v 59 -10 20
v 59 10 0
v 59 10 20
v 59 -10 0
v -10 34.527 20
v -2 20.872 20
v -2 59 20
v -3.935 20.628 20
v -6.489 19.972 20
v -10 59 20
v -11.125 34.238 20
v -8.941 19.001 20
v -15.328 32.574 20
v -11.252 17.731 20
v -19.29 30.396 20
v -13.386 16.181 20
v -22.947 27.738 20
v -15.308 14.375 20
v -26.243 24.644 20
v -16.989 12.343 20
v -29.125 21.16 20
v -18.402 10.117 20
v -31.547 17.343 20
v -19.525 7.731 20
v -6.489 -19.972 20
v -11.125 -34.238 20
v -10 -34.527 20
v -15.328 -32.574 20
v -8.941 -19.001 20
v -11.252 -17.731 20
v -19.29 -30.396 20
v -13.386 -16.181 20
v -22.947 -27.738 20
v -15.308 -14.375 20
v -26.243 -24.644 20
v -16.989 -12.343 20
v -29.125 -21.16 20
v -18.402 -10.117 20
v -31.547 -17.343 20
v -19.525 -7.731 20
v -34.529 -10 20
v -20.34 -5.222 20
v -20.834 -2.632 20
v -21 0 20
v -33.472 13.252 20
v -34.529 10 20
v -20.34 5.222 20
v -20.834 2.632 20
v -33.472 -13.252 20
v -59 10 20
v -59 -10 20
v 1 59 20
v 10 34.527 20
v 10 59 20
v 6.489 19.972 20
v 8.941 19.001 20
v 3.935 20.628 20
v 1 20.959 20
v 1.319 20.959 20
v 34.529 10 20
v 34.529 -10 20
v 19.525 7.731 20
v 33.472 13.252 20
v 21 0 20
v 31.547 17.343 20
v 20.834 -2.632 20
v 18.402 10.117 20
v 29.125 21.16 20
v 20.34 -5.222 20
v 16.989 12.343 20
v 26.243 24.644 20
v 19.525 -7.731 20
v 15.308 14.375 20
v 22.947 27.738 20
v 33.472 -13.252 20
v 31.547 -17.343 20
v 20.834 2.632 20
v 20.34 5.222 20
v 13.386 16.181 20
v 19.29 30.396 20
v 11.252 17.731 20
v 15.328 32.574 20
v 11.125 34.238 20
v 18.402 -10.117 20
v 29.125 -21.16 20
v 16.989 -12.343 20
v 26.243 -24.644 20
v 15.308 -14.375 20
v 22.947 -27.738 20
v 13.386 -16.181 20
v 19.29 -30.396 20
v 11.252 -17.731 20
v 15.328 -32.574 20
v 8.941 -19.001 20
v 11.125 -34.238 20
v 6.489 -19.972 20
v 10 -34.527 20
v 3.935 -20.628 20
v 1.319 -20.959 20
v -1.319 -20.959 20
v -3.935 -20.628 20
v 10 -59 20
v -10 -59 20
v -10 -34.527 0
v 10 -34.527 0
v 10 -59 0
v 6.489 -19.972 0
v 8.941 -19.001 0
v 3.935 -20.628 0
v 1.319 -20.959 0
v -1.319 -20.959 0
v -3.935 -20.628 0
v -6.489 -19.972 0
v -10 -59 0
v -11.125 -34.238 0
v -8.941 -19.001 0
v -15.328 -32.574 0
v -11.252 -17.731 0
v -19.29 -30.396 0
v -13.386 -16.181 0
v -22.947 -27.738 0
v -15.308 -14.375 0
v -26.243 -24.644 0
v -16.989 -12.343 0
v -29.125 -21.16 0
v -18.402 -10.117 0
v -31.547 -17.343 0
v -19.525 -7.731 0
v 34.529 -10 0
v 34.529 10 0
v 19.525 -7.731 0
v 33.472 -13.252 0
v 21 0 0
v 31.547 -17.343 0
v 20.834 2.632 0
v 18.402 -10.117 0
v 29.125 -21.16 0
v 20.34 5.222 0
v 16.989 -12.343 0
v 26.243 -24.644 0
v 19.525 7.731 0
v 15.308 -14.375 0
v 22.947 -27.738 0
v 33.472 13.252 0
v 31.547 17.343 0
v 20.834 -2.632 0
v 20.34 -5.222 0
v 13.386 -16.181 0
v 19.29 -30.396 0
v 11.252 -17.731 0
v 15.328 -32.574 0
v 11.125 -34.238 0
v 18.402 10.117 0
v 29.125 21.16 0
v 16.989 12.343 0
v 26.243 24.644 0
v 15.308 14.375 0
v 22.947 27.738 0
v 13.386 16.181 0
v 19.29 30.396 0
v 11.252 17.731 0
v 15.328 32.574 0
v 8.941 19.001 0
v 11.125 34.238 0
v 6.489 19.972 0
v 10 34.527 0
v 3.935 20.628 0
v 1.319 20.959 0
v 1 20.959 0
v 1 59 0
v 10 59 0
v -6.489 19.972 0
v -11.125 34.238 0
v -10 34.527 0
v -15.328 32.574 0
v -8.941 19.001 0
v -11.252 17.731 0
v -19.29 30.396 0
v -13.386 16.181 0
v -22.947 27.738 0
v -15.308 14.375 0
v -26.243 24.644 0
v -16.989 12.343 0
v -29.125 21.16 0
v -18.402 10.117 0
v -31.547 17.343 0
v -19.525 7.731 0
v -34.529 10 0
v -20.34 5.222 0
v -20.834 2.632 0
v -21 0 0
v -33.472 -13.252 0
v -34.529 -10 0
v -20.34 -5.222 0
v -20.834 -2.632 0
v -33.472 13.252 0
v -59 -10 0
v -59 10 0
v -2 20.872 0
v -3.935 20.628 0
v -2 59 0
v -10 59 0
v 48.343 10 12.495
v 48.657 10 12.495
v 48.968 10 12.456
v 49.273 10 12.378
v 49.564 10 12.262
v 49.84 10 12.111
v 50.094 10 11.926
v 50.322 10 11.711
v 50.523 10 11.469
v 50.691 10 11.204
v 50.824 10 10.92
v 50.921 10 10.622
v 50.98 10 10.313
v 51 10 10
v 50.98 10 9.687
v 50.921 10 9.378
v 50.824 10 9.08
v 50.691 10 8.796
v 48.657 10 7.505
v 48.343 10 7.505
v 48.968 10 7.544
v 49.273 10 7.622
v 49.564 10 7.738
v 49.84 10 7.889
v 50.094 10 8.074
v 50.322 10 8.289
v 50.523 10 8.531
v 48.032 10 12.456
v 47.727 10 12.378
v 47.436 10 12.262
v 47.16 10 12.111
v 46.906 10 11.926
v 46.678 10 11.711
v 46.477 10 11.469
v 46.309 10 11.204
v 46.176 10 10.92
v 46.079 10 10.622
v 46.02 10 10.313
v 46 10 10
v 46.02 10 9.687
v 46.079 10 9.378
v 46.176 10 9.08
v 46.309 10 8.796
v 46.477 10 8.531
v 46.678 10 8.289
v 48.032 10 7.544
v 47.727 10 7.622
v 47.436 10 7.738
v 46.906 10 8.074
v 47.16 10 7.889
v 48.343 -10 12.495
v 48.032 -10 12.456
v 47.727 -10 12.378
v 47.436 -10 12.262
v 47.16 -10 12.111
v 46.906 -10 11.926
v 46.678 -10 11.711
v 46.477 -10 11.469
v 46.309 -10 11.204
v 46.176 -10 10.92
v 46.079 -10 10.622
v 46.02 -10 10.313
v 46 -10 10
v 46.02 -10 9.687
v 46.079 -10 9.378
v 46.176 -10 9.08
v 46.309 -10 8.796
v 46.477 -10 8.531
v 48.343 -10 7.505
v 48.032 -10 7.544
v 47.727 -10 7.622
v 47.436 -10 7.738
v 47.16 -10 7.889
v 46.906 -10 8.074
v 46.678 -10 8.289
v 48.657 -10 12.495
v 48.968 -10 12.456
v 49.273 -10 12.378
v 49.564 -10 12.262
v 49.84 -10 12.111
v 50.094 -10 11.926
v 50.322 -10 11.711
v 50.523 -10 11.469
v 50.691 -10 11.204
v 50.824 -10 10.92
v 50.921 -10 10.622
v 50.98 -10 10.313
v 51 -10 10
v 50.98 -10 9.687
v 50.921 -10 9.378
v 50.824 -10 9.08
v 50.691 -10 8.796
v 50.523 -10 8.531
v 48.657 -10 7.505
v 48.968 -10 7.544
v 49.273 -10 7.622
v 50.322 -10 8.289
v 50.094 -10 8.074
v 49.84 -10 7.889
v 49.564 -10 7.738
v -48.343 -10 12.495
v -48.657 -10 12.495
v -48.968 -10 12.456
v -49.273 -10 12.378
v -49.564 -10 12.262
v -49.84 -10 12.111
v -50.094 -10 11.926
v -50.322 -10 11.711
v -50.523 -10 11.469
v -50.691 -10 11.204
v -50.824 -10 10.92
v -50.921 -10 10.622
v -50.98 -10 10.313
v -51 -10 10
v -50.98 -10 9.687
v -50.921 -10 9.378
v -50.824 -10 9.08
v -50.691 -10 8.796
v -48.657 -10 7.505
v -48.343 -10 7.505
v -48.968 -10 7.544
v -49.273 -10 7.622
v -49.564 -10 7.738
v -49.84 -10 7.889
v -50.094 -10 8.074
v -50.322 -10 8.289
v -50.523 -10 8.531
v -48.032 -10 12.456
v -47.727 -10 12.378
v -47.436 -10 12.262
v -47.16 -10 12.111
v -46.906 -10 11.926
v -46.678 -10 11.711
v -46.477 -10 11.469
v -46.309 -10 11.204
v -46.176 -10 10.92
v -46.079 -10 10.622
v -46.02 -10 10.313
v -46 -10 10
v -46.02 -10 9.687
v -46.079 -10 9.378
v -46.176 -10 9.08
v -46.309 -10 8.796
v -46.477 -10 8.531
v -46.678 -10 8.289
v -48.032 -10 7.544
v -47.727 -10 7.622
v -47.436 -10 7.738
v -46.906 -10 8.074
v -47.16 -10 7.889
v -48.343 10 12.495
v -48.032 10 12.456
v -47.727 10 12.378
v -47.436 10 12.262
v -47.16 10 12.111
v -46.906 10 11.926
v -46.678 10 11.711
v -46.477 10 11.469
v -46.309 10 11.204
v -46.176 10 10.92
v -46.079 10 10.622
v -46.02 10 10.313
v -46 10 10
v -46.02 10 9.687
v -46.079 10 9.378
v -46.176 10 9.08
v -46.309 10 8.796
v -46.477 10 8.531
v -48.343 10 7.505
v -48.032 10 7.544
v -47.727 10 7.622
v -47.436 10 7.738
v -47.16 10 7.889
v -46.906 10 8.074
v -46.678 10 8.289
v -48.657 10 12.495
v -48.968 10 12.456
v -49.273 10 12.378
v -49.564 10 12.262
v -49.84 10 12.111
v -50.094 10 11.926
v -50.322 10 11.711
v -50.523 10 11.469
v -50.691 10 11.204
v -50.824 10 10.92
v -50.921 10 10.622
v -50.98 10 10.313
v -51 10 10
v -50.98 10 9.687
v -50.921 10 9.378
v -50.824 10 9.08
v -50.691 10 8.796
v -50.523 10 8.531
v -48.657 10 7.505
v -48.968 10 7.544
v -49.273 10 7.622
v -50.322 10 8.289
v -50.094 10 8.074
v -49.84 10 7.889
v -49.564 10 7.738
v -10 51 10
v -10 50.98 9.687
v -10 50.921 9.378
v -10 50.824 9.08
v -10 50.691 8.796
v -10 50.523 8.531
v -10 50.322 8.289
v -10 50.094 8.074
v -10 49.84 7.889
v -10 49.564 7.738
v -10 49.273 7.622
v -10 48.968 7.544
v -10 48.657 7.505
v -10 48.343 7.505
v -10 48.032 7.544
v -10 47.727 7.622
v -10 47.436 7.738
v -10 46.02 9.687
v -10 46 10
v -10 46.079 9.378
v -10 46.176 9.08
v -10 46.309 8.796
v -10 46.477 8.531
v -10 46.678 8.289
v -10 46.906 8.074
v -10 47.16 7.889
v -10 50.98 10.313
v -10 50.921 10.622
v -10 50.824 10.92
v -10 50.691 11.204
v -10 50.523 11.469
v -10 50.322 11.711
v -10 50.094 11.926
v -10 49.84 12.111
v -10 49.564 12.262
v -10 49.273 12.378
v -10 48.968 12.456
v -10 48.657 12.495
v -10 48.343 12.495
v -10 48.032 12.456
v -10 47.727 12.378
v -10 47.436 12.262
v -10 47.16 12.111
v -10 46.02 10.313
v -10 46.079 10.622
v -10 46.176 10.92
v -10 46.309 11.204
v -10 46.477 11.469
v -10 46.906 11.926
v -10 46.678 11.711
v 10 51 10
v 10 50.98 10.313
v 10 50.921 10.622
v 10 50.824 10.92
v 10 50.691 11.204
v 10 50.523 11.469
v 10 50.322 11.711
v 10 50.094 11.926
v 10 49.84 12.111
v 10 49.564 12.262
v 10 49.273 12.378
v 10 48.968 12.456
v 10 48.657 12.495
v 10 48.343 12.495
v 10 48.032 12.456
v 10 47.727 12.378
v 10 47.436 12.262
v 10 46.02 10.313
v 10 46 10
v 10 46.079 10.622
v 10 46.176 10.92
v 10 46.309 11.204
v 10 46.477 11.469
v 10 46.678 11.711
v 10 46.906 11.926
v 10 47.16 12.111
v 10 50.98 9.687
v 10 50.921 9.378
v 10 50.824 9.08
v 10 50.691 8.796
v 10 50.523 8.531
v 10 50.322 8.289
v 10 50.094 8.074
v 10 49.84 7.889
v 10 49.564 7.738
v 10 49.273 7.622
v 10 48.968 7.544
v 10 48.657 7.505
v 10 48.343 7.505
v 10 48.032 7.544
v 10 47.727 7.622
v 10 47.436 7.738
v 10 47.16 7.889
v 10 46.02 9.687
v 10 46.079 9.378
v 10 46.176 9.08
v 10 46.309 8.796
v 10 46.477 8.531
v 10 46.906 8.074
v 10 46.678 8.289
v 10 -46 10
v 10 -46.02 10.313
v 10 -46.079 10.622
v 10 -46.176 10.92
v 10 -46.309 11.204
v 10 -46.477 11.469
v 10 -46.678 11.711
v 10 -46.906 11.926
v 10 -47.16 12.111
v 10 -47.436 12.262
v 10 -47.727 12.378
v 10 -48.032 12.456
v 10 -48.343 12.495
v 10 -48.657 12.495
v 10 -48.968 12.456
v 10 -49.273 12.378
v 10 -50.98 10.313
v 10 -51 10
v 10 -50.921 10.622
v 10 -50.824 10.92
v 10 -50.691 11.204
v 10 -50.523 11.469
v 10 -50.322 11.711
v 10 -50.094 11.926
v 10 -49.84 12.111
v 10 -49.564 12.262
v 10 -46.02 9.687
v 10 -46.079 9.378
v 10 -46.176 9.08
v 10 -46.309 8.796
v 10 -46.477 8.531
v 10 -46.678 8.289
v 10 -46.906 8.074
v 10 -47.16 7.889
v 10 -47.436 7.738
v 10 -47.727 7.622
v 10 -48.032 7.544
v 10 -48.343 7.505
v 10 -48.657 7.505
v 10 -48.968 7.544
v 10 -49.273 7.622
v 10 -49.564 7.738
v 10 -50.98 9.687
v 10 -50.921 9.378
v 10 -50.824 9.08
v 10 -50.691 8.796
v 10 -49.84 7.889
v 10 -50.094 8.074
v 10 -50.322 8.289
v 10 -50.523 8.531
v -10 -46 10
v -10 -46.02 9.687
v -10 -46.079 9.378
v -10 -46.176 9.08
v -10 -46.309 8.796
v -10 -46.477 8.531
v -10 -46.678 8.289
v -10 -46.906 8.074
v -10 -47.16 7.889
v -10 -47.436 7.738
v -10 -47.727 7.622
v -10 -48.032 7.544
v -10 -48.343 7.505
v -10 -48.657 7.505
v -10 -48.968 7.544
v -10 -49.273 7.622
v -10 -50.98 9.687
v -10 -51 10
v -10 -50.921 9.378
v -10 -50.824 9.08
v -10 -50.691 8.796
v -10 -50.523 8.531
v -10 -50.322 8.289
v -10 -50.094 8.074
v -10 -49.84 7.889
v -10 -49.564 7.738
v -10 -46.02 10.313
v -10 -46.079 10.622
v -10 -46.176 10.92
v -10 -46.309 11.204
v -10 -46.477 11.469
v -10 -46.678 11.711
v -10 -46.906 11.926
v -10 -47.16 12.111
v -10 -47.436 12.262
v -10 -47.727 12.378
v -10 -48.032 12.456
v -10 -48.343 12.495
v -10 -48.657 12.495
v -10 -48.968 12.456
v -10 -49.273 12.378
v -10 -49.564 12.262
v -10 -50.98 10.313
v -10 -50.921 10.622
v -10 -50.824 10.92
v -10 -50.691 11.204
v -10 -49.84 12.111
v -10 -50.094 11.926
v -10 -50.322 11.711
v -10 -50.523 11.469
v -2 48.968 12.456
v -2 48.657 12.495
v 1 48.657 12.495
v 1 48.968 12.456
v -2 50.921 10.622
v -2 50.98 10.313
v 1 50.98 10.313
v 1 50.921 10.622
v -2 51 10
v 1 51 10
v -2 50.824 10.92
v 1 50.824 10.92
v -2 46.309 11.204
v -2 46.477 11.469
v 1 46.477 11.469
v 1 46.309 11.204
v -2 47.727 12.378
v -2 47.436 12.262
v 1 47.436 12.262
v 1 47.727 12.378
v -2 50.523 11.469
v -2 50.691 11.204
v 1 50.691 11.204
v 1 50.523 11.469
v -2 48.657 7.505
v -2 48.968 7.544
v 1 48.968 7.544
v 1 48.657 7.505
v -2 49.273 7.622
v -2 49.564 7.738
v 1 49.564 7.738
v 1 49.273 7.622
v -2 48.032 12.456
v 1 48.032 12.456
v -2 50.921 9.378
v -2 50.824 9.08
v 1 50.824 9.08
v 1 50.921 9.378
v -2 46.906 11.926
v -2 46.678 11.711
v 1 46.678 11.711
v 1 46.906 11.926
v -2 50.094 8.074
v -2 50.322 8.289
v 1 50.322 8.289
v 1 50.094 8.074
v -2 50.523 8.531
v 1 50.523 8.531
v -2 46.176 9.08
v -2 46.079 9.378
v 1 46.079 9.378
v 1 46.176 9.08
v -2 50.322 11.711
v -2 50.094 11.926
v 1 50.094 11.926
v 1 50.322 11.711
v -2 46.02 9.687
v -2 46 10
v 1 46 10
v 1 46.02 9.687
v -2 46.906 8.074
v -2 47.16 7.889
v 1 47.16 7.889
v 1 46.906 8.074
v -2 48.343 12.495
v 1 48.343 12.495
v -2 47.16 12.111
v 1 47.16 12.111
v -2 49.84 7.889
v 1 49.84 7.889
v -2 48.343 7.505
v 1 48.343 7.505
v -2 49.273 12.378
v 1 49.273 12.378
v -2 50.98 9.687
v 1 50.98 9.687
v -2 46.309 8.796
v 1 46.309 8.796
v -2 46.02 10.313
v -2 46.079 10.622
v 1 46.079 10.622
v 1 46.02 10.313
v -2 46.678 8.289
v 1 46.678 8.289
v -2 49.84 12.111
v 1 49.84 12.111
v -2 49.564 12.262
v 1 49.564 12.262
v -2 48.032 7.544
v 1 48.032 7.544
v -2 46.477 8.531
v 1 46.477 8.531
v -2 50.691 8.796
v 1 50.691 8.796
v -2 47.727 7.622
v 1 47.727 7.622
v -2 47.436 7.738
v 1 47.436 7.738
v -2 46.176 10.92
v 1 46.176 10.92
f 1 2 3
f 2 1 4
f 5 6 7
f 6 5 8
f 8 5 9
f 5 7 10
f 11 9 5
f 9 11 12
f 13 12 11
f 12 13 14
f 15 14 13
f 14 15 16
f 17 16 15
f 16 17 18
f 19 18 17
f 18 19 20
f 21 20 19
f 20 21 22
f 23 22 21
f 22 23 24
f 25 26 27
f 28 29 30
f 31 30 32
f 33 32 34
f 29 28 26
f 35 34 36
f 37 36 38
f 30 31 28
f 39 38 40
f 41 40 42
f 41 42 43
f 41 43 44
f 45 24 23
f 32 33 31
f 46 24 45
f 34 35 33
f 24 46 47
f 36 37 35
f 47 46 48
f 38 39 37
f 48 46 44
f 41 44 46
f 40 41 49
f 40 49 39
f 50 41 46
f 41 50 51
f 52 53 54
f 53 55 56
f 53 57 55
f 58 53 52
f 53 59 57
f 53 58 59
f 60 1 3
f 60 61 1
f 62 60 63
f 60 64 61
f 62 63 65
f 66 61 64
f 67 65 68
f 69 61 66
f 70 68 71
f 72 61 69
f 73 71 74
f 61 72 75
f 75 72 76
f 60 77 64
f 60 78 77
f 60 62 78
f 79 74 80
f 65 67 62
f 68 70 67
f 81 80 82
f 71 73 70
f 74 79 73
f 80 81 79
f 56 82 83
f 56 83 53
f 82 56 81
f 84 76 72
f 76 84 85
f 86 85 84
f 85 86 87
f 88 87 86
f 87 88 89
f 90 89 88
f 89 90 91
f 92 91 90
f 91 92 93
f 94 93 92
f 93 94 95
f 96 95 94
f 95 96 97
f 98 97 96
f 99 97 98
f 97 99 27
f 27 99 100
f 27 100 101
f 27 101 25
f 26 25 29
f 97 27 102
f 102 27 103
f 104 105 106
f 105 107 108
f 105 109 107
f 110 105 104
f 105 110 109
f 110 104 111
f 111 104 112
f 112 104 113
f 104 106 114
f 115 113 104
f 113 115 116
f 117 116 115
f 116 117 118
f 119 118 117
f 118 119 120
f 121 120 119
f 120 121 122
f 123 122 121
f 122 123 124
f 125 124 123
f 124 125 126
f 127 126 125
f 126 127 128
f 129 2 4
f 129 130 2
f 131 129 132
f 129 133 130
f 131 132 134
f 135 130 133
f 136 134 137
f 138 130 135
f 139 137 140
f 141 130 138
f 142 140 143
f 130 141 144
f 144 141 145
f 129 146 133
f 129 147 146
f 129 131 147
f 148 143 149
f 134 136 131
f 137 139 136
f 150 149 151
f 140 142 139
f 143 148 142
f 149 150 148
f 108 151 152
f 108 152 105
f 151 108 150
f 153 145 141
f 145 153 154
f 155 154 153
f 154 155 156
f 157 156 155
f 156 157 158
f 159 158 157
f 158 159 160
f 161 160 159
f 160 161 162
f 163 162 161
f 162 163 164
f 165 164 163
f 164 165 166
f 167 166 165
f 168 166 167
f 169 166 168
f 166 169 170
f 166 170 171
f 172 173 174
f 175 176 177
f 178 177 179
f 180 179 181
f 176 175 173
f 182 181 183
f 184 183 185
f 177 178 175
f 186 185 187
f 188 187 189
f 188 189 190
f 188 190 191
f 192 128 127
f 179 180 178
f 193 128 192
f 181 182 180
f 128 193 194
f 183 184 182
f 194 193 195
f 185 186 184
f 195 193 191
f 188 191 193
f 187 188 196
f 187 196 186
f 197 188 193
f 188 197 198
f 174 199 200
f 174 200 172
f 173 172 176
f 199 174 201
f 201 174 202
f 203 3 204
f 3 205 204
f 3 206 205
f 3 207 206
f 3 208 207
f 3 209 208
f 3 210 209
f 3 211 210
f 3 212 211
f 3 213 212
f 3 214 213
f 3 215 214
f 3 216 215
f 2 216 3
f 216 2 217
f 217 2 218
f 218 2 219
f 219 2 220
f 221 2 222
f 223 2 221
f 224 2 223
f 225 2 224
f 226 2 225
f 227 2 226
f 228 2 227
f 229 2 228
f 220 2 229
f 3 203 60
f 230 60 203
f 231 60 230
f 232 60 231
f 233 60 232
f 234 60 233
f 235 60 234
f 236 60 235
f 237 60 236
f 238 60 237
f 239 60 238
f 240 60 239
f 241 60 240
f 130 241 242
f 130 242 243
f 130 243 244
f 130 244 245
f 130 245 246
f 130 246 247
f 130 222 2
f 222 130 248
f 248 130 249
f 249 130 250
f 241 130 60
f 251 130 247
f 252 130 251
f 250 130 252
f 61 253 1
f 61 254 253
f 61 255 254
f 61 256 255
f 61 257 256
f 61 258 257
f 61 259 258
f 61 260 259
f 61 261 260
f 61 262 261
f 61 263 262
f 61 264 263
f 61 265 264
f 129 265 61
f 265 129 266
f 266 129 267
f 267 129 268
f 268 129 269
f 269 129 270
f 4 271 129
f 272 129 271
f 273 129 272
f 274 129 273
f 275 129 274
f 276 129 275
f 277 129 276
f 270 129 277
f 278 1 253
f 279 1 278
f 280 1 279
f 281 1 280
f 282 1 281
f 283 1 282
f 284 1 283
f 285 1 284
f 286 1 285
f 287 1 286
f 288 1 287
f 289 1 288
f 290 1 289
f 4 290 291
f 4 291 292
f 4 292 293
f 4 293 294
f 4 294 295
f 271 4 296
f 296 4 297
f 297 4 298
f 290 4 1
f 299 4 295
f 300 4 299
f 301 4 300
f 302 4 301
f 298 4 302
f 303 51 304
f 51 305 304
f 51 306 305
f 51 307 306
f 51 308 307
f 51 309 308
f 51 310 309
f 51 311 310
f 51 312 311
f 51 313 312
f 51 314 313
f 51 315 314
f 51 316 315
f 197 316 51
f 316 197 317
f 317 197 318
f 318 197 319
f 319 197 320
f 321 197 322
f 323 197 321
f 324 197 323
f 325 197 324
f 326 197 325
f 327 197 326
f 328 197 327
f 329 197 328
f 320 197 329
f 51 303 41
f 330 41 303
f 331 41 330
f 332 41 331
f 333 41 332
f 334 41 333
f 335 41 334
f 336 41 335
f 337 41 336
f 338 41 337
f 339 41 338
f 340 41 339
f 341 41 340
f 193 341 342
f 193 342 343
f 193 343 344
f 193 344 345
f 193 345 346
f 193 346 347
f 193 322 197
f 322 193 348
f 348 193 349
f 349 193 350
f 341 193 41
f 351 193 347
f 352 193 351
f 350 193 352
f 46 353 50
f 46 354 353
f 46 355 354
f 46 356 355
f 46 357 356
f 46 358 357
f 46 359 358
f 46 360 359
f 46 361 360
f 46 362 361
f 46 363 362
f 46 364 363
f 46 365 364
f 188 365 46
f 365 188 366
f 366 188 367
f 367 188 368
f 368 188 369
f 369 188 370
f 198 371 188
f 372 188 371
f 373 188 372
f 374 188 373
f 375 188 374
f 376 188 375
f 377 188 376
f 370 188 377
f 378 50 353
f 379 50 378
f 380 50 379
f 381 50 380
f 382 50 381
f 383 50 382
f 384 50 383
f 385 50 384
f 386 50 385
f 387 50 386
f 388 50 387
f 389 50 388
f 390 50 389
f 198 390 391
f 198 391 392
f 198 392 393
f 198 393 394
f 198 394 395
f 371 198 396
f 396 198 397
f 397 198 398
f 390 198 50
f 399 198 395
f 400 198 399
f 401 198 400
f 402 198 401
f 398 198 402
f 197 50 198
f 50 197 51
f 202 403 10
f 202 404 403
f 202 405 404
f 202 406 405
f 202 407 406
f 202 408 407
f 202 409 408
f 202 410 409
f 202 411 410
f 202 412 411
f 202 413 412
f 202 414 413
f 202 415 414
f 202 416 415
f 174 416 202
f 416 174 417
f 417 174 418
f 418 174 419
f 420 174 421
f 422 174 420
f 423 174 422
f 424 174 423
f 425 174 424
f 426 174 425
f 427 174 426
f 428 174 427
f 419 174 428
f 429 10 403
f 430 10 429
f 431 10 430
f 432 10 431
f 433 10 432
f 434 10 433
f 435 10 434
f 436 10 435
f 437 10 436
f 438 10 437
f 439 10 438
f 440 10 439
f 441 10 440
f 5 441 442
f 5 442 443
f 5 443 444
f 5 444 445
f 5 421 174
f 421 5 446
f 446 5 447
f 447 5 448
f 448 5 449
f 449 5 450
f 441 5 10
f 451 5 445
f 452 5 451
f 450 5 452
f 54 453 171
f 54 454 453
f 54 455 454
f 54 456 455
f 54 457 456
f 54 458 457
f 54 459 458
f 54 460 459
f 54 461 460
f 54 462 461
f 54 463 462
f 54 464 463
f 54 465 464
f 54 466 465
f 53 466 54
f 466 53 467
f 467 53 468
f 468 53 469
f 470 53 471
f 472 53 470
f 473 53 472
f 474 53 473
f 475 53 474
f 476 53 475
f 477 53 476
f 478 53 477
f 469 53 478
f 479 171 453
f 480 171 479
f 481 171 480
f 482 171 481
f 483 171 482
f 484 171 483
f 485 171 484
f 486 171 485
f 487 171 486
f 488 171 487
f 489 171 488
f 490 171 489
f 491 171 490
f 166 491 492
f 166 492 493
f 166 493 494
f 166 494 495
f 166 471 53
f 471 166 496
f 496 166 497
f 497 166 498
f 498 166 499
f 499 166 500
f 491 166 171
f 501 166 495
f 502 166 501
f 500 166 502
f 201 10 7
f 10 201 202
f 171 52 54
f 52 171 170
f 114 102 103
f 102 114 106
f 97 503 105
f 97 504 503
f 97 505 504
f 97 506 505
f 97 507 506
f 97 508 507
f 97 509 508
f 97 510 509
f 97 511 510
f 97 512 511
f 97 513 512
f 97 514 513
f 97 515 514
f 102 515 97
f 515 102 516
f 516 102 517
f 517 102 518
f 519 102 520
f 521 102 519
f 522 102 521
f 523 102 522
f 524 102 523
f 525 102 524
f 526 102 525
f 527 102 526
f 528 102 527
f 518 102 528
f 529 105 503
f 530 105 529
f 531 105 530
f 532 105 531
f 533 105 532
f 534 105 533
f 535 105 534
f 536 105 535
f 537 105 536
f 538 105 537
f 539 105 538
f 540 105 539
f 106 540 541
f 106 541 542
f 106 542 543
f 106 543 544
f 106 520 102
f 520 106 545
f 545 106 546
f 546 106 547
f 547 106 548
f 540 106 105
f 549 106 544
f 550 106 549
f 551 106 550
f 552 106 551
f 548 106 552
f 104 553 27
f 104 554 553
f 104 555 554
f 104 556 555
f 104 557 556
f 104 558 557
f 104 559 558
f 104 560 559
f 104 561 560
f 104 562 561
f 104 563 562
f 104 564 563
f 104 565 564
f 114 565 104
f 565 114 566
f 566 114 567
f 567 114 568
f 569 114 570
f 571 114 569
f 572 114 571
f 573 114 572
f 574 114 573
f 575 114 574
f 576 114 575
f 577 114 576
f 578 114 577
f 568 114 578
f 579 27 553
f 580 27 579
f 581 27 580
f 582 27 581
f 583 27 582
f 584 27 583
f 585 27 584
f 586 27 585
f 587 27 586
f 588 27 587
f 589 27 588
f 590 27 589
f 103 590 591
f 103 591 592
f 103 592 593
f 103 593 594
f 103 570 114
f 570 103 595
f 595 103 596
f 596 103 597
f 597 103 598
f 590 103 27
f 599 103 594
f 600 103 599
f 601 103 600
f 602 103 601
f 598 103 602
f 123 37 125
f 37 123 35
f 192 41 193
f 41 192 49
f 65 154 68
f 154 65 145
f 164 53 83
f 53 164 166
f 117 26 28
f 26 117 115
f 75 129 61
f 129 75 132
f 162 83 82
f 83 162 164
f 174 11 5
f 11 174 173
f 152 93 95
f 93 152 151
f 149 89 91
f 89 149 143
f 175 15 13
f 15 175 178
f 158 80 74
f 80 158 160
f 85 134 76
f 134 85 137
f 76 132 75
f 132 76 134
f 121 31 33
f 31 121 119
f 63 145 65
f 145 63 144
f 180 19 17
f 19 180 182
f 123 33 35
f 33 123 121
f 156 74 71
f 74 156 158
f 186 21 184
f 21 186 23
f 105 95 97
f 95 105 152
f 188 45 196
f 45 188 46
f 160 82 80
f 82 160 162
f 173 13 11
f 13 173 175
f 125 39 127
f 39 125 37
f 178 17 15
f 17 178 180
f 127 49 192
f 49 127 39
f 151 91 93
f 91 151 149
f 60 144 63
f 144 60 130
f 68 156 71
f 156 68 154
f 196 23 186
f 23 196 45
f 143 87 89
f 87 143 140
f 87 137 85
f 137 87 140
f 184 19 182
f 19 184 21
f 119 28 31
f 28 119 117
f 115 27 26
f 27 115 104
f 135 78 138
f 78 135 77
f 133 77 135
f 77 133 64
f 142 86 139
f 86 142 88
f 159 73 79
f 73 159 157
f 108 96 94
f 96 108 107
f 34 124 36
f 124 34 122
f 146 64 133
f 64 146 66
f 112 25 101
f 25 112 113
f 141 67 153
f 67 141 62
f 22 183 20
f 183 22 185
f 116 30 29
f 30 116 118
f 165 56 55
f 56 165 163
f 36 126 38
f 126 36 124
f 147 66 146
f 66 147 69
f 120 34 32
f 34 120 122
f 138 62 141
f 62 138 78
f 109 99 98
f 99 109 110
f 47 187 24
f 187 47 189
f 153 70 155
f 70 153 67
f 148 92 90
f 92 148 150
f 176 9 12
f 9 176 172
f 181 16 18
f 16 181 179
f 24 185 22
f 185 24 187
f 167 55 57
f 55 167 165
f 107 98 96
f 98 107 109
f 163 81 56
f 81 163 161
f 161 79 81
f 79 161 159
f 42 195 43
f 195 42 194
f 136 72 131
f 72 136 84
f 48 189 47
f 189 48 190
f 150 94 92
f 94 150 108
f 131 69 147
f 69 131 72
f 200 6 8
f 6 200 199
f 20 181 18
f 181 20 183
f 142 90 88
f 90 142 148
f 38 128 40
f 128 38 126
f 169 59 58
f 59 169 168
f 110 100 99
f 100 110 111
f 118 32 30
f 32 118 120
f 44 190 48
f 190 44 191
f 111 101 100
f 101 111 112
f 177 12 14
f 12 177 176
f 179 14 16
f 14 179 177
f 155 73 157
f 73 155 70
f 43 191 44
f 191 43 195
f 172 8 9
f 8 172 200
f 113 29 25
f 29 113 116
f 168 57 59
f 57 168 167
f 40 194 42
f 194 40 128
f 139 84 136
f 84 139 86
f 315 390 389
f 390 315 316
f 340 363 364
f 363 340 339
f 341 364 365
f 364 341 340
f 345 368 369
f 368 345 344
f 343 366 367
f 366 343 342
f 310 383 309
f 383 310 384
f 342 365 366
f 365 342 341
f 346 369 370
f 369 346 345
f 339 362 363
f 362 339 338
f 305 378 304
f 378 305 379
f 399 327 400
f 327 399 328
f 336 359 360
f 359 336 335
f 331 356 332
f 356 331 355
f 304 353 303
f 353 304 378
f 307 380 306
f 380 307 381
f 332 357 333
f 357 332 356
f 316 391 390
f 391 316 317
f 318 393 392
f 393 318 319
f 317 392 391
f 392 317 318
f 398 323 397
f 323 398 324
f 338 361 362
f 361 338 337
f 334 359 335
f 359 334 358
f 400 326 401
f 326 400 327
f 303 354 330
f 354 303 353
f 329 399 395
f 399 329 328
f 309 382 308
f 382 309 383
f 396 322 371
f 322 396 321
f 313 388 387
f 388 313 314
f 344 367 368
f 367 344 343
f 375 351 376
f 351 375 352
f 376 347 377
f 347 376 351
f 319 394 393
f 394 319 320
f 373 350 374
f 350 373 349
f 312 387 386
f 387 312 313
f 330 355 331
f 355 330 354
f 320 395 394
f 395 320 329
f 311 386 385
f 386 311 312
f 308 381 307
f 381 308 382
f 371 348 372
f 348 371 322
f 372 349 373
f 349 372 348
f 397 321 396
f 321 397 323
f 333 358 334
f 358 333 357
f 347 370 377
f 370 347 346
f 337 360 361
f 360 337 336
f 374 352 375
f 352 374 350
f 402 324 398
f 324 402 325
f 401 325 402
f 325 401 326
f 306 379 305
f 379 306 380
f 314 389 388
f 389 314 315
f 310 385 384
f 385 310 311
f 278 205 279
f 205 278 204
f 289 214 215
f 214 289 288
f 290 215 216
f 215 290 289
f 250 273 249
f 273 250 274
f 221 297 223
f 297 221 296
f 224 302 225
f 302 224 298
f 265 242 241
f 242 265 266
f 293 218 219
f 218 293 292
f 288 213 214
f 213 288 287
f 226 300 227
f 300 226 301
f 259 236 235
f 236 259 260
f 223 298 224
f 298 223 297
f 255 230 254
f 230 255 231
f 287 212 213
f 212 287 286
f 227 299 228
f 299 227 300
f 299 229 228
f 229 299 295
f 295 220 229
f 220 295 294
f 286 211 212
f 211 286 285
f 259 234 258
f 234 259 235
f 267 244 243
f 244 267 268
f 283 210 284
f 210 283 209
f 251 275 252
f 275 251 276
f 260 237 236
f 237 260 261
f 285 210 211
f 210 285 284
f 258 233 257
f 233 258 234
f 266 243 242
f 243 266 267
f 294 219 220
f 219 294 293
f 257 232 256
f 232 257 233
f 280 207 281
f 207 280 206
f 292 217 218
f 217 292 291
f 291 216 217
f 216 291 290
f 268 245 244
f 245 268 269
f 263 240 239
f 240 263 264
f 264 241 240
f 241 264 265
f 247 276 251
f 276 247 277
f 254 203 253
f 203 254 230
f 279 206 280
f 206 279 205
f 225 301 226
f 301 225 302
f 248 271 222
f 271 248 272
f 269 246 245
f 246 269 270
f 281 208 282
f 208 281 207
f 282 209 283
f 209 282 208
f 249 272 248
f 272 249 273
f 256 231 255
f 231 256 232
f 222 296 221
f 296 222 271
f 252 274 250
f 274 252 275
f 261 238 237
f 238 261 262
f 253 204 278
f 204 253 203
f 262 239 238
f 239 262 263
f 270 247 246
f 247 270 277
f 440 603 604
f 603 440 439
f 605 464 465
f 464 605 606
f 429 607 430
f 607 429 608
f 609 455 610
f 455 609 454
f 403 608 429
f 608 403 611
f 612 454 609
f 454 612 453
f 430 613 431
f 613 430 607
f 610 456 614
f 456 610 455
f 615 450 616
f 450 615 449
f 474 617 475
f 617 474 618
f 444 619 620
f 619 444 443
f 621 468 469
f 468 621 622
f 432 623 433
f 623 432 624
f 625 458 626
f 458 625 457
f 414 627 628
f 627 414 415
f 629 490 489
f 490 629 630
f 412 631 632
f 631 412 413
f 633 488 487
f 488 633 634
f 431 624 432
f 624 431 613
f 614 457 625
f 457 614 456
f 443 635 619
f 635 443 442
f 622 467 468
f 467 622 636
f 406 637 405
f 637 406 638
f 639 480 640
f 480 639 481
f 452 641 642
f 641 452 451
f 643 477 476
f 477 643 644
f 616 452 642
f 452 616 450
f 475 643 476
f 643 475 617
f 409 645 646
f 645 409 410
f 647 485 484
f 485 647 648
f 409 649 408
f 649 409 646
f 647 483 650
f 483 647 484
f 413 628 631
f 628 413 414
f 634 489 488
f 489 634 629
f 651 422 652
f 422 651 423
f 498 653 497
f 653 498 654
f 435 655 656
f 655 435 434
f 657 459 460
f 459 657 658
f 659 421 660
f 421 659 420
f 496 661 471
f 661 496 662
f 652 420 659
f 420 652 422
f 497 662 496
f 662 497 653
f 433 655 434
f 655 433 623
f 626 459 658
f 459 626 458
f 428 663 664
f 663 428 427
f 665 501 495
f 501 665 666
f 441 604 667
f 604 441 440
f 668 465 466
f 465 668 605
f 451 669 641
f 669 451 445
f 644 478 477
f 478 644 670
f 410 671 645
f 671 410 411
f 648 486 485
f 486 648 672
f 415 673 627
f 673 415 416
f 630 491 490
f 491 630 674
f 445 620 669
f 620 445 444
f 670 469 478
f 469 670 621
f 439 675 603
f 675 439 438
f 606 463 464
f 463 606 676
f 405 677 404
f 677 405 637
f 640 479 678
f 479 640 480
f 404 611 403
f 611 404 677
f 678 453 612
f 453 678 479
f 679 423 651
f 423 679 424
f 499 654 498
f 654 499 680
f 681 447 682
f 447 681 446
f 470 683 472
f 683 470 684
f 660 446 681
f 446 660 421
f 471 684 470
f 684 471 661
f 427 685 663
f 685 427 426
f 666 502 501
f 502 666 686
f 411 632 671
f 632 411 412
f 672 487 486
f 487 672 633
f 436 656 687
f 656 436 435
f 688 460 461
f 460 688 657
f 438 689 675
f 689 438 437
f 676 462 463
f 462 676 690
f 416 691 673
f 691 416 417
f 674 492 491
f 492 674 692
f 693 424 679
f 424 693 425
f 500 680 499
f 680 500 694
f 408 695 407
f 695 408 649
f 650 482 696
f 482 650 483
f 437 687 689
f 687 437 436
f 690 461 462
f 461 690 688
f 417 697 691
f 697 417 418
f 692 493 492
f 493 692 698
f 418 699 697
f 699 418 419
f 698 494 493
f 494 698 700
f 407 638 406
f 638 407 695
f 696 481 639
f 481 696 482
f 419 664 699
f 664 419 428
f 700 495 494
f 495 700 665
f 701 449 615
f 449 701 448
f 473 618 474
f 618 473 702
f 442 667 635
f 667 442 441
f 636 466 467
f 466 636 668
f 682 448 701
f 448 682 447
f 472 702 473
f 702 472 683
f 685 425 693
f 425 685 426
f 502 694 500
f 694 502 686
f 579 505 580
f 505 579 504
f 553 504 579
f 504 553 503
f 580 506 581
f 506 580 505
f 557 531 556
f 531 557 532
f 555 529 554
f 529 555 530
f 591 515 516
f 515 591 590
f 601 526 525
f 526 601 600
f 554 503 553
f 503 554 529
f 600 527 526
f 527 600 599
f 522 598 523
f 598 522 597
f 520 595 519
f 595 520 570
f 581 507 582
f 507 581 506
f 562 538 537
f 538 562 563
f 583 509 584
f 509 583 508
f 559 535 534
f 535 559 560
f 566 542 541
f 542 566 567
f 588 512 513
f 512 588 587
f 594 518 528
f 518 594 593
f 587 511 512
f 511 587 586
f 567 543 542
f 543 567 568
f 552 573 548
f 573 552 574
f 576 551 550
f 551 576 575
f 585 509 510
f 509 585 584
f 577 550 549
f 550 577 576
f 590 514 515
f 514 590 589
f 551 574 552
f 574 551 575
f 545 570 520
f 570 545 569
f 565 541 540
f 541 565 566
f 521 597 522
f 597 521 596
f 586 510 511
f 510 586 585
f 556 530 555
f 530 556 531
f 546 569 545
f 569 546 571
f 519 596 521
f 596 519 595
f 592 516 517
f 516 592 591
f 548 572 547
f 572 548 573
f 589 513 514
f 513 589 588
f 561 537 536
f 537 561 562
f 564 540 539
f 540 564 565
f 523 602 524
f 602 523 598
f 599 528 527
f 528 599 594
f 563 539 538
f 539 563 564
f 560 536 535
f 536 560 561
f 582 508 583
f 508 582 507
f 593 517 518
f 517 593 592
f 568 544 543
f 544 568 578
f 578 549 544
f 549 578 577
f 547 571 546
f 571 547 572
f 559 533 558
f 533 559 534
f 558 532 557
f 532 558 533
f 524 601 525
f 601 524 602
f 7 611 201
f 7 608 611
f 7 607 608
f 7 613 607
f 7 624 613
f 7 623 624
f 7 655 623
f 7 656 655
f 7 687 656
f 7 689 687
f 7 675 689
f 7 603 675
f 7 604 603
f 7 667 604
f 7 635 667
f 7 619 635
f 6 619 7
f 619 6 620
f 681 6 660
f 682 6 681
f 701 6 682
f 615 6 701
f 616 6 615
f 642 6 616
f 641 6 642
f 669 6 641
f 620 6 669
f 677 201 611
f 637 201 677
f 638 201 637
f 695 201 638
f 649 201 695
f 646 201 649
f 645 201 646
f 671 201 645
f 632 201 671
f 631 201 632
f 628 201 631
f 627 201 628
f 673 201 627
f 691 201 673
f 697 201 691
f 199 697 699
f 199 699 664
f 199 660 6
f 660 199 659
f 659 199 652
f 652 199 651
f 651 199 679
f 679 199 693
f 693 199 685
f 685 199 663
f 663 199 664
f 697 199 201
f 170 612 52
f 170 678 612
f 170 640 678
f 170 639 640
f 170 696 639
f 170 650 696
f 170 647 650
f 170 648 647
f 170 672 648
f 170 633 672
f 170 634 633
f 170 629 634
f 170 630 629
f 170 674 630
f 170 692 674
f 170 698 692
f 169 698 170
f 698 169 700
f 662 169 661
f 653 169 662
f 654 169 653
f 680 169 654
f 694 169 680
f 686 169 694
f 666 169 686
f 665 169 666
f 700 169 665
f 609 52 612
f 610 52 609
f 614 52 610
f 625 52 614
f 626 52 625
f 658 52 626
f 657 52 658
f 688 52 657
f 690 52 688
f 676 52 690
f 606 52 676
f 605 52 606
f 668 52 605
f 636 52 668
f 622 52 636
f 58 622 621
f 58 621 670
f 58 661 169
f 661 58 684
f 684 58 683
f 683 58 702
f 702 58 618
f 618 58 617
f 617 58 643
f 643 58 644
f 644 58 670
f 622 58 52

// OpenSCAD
// Universal quadpod
// central part 
// OK1CDJ 2015

$fn=50;
base_width = 25; // lenght of each base arm
base_thickness = 20; // thickness of the base
holder_wall = 15; // wall thickness arroud mast
hole_dia = 42; // size of the hole for the center mast
screw_dia=6;   // hole for screw
arm_width=20; // with of arm
spacer=3;     // space in arm

module holder()
{
	difference(){
		union(){
			translate([hole_dia/2+holder_wall-2,-arm_width/2,0])
			cube([base_width,arm_width,base_thickness],center=false);
		   rotate([0,0,180])translate([hole_dia/2+holder_wall-2,-arm_width/2,0])
			cube([base_width,arm_width,base_thickness],center=false);
			rotate([0,0,90])translate([hole_dia/2+holder_wall-2,-arm_width/2,0])
			cube([base_width,arm_width,base_thickness],center=false);
			rotate([0,0,270])translate([hole_dia/2+holder_wall-2,-arm_width/2,0])
			cube([base_width,arm_width,base_thickness],center=false);
			
       	cylinder(h = base_thickness , d =hole_dia+holder_wall*2, center = false);
			
            
           
	}
  		
		cylinder(h = base_thickness+50, d= hole_dia, center=true);
		translate([0,0,base_thickness/2])rotate([90,0,0])
	
		
		translate([-(hole_dia/2+holder_wall+base_width/2),0,0])cylinder(h=100,d=5,center=true);
        translate([0,0,base_thickness/2])rotate([90,0,0])
        translate([(hole_dia/2+holder_wall+base_width/2),0,0])cylinder(h=100,d=5,center=true);
		
		translate([0,(hole_dia/2+holder_wall+base_width/2),base_thickness/2])rotate([90,0,90])
		cylinder(h=100,d=5,center=true);
		translate([0,-(hole_dia/2+holder_wall+base_width/2),base_thickness/2])rotate([90,0,90])
		cylinder(h=100,d=5,center=true);
		rotate([0,0,90]) translate([hole_dia/2-2,-1,-2])
			cube([hole_dia/2+holder_wall+base_width,spacer,base_thickness+4],center=false);
	}
}

union()
{
holder();
}
